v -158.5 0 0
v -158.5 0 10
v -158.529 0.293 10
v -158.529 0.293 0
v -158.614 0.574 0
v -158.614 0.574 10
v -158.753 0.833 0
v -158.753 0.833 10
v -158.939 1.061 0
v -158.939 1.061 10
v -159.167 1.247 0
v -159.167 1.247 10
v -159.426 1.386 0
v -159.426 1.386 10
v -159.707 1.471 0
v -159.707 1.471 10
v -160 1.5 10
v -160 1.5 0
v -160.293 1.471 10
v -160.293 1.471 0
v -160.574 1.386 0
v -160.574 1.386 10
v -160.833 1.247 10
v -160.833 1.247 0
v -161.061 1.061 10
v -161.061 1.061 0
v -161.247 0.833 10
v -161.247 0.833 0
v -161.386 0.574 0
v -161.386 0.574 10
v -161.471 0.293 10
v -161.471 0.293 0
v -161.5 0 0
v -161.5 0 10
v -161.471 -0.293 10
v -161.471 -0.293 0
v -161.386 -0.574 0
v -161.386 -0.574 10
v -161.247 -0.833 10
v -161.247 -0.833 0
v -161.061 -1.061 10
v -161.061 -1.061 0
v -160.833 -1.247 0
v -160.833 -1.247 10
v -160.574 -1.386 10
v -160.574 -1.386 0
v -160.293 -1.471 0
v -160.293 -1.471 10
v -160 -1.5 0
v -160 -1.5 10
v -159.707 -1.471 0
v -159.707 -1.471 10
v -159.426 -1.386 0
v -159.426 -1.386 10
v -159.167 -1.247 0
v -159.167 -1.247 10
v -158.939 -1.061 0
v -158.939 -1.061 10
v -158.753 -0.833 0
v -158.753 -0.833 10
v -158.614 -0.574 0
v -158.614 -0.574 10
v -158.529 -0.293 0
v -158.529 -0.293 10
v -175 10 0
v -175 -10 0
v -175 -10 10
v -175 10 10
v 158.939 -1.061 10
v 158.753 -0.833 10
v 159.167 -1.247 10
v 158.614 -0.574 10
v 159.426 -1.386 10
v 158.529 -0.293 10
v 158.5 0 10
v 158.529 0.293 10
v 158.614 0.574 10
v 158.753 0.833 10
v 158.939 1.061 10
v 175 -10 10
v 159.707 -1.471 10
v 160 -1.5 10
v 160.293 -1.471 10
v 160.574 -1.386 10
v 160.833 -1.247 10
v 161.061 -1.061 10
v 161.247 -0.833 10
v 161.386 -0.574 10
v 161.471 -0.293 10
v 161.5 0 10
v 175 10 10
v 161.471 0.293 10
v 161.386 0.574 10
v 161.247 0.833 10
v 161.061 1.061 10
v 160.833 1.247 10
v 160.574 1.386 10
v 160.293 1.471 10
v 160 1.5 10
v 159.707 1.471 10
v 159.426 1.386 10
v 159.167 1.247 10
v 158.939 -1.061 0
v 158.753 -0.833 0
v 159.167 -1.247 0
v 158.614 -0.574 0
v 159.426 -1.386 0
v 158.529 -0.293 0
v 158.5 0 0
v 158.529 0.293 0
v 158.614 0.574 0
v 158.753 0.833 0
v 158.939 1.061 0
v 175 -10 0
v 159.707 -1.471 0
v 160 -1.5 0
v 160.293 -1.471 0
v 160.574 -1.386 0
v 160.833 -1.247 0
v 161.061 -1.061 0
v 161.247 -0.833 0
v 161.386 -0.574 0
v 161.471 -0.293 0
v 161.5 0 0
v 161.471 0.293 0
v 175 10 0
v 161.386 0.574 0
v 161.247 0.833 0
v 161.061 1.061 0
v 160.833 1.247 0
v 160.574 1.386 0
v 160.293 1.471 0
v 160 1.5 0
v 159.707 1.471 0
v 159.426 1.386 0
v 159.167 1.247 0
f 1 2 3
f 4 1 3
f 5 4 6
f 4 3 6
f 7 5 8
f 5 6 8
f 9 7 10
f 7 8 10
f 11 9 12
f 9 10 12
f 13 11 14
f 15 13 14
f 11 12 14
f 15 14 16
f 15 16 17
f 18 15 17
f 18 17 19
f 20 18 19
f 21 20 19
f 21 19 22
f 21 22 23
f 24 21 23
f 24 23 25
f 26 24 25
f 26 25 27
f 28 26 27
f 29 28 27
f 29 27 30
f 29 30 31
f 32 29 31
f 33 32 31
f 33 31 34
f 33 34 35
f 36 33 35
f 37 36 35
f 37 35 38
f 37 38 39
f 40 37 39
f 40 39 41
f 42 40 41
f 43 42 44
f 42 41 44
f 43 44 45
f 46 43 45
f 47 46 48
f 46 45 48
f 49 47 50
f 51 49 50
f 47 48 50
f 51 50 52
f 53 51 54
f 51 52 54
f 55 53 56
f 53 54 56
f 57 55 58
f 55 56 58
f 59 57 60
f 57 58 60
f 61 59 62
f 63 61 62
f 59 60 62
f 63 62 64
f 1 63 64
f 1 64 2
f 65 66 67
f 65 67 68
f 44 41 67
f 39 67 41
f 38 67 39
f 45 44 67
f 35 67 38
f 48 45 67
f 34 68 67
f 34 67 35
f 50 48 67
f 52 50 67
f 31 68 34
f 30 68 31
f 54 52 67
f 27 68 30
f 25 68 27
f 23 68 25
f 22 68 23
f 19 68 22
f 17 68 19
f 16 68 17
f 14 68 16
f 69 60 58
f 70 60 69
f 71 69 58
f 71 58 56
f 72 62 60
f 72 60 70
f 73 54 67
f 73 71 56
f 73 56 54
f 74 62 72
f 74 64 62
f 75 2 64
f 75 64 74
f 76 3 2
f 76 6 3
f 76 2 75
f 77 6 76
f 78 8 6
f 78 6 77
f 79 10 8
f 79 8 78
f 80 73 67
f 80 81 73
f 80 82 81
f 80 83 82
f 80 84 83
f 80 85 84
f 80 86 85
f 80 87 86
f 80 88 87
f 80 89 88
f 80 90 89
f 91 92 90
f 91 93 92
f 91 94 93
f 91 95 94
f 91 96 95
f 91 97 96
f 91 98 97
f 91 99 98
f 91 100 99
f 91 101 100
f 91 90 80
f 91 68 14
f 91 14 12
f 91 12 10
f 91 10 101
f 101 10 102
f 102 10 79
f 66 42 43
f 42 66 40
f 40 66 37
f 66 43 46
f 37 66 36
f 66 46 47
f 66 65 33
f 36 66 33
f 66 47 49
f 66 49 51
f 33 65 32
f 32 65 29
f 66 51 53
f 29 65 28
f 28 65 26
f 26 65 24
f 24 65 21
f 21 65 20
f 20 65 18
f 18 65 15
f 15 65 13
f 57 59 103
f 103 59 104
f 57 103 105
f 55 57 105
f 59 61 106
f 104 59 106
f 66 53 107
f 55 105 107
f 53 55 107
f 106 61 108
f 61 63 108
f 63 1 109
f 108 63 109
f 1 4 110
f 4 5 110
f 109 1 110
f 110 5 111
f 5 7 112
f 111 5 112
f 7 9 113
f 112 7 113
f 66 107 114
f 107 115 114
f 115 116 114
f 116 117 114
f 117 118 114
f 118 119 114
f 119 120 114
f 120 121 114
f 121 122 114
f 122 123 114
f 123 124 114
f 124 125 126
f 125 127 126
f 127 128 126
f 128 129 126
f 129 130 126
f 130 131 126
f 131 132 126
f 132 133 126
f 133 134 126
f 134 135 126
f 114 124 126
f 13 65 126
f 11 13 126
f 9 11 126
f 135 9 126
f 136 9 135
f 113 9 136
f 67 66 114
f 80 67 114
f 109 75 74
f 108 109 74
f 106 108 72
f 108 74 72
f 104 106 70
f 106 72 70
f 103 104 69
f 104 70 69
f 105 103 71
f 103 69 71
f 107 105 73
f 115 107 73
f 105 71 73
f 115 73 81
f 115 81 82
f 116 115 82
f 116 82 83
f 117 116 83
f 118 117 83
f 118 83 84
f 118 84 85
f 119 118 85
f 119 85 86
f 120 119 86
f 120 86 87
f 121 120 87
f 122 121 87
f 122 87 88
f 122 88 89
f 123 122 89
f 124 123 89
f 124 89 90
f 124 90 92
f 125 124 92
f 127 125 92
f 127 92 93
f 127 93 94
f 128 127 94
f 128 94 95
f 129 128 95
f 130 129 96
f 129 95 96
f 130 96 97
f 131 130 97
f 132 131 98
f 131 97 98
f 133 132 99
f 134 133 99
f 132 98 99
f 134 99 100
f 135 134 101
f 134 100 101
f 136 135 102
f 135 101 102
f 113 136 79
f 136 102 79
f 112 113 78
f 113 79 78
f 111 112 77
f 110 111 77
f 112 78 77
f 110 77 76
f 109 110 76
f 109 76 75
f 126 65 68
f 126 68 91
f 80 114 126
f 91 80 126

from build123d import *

# Parameters (mm, degrees)
SKETCH1_W           = 350
SKETCH1_H           = 20
BOSS_EXTRUDE1_DEPTH = 10
SKETCH2_R           = 1.5
CUT_EXTRUDE1_DEPTH  = 176.570498661


with BuildPart() as part:
    # Sketch1 → Boss-Extrude1 (new body)
    with BuildSketch(Plane.XY):
        Rectangle(SKETCH1_W, SKETCH1_H)
    extrude(amount=BOSS_EXTRUDE1_DEPTH)

    # Sketch2 → Cut-Extrude1 (cut, through all)
    with BuildSketch(Plane.XY.offset(10)):
        with Locations((-160, 0)):
            Circle(SKETCH2_R)
        with Locations(Location((160, 0, 0), (0, 0, 180))):
            Circle(SKETCH2_R)
    extrude(amount=-CUT_EXTRUDE1_DEPTH, mode=Mode.SUBTRACT)


solid = part.part
